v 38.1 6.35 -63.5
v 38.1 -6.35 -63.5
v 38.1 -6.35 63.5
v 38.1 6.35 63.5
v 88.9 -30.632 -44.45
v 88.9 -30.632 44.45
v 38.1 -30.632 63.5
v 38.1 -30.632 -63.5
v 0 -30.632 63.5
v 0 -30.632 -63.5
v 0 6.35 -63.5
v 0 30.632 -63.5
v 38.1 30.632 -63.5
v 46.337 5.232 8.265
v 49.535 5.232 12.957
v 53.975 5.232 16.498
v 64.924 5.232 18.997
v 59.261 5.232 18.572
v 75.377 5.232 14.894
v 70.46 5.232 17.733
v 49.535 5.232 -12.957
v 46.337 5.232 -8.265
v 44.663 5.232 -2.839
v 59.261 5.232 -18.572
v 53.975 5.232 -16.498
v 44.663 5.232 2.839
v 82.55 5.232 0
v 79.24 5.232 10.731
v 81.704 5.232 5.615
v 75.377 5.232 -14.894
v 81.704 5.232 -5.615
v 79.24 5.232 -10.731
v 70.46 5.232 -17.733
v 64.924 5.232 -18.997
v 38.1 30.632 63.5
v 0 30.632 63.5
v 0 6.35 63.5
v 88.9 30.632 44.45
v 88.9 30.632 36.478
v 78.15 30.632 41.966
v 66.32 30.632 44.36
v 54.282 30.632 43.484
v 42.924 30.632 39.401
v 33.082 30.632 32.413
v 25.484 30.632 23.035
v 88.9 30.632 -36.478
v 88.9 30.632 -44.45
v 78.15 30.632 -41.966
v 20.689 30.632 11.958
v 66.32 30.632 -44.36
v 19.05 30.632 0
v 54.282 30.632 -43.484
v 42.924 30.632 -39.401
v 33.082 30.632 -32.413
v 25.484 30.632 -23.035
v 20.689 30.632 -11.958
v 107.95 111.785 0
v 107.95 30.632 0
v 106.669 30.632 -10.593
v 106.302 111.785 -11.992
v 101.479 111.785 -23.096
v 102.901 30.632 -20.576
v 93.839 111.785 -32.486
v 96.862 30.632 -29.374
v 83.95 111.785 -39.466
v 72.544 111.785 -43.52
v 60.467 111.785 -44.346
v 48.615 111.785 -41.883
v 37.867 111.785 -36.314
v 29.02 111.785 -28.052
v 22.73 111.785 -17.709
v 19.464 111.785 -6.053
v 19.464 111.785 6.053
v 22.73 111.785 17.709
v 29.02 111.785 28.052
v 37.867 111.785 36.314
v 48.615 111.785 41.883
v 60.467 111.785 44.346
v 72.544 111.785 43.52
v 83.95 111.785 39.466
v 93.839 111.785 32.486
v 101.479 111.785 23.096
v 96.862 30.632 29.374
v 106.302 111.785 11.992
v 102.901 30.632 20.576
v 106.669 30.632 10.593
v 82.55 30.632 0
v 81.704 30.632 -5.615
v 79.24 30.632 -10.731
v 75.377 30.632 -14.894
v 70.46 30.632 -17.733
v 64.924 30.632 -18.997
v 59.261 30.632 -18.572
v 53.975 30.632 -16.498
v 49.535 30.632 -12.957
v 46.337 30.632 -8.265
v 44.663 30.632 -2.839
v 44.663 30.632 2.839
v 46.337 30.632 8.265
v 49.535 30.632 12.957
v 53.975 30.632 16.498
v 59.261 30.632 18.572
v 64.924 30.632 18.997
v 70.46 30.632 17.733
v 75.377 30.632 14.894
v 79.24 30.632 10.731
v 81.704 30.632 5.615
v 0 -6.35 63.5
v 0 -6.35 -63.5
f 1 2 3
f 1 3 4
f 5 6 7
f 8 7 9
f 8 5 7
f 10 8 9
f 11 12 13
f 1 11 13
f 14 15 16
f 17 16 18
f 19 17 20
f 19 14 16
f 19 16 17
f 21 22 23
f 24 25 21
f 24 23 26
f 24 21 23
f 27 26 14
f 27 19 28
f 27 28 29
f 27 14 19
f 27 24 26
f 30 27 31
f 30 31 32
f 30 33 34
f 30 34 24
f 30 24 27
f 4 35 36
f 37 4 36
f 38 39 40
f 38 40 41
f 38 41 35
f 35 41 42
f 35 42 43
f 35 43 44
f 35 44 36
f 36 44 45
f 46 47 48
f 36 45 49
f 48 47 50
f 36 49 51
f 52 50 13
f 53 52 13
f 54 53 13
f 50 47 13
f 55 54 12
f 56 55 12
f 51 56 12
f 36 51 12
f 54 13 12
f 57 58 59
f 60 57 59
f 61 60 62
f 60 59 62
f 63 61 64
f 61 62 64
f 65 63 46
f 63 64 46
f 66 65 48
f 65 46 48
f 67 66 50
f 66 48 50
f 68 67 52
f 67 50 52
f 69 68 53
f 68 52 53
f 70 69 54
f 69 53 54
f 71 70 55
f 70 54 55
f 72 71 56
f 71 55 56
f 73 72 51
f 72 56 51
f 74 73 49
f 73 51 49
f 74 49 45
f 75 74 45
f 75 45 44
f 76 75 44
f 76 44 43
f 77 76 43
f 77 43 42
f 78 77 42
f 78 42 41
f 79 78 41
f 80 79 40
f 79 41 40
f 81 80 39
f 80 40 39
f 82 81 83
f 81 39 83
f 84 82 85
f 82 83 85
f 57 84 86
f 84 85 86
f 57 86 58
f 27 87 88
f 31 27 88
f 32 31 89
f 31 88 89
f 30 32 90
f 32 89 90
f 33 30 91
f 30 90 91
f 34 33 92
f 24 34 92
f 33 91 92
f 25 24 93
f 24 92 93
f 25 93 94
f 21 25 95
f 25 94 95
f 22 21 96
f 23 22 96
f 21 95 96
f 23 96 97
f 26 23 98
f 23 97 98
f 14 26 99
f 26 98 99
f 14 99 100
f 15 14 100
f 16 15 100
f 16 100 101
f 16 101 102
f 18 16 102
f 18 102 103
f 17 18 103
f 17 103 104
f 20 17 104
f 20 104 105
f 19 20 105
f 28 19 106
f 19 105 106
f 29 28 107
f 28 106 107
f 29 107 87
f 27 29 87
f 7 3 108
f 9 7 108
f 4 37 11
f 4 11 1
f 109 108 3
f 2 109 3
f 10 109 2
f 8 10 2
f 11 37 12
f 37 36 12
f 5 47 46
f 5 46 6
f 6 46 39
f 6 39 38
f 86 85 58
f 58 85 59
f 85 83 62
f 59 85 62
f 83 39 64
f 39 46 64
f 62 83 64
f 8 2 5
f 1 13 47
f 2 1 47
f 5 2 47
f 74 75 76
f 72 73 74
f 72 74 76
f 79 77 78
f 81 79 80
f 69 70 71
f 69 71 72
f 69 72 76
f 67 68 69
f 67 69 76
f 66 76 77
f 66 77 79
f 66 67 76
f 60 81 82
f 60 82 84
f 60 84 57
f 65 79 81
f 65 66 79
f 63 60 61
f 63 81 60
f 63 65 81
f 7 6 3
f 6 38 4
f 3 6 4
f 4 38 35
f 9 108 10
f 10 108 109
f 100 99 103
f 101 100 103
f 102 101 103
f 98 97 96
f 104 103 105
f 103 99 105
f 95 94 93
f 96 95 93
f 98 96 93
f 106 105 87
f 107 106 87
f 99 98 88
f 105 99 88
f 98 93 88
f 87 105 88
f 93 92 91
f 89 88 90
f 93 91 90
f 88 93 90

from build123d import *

# Parameters (mm, degrees)
BASE_APPROXIMATE_DEPTH       = 30.6324
BEAM_CHANNEL_CROSS_SECTION_W = 38.1
BEAM_CHANNEL_CROSS_SECTION_H = 12.7
BEAM_CHANNEL_DEPTH           = 64.5
BEAM_CHANNEL_DEPTH_BACK      = 64.5
HOLE_CROSS_SECTION_R         = 19.05
HOLE_DEPTH                   = 25.4
ROUND_PART_CROSS_SECTION_R   = 44.45
ROUND_PART_DEPTH             = 81.153


with BuildPart() as part:
    # Base → Base Approximate (new body, symmetric)
    with BuildSketch(Plane(origin=(0, 0, 0), x_dir=(1, 0, 0), z_dir=(0, 1, 0))):
        Polygon((0, -63.5), (0, 63.5), (38.1, 63.5), (88.9, 44.45), (88.9, -44.45), (38.1, -63.5), align=None)
    extrude(amount=BASE_APPROXIMATE_DEPTH, both=True)

    # Beam Channel Cross Section → Beam Channel (cut, two sides)
    with BuildSketch(Plane.XY) as beam_channel_sk:
        with Locations((19.05, 0)):
            Rectangle(BEAM_CHANNEL_CROSS_SECTION_W, BEAM_CHANNEL_CROSS_SECTION_H)
    extrude(amount=BEAM_CHANNEL_DEPTH, mode=Mode.SUBTRACT)
    extrude(beam_channel_sk.sketch, amount=-BEAM_CHANNEL_DEPTH_BACK, mode=Mode.SUBTRACT)

    # Hole Cross Section → Hole (cut)
    with BuildSketch(Plane(origin=(0, 30.6324, 0), x_dir=(1, 0, 0), z_dir=(0, 1, 0))):
        with Locations((63.5, 0)):
            Circle(HOLE_CROSS_SECTION_R)
    extrude(amount=-HOLE_DEPTH, mode=Mode.SUBTRACT)

    # Round Part Cross Section → Round Part (add)
    with BuildSketch(Plane(origin=(0, 30.6324, 0), x_dir=(1, 0, 0), z_dir=(0, 1, 0))):
        with Locations((63.5, 0)):
            Circle(ROUND_PART_CROSS_SECTION_R)
    extrude(amount=ROUND_PART_DEPTH)


solid = part.part
